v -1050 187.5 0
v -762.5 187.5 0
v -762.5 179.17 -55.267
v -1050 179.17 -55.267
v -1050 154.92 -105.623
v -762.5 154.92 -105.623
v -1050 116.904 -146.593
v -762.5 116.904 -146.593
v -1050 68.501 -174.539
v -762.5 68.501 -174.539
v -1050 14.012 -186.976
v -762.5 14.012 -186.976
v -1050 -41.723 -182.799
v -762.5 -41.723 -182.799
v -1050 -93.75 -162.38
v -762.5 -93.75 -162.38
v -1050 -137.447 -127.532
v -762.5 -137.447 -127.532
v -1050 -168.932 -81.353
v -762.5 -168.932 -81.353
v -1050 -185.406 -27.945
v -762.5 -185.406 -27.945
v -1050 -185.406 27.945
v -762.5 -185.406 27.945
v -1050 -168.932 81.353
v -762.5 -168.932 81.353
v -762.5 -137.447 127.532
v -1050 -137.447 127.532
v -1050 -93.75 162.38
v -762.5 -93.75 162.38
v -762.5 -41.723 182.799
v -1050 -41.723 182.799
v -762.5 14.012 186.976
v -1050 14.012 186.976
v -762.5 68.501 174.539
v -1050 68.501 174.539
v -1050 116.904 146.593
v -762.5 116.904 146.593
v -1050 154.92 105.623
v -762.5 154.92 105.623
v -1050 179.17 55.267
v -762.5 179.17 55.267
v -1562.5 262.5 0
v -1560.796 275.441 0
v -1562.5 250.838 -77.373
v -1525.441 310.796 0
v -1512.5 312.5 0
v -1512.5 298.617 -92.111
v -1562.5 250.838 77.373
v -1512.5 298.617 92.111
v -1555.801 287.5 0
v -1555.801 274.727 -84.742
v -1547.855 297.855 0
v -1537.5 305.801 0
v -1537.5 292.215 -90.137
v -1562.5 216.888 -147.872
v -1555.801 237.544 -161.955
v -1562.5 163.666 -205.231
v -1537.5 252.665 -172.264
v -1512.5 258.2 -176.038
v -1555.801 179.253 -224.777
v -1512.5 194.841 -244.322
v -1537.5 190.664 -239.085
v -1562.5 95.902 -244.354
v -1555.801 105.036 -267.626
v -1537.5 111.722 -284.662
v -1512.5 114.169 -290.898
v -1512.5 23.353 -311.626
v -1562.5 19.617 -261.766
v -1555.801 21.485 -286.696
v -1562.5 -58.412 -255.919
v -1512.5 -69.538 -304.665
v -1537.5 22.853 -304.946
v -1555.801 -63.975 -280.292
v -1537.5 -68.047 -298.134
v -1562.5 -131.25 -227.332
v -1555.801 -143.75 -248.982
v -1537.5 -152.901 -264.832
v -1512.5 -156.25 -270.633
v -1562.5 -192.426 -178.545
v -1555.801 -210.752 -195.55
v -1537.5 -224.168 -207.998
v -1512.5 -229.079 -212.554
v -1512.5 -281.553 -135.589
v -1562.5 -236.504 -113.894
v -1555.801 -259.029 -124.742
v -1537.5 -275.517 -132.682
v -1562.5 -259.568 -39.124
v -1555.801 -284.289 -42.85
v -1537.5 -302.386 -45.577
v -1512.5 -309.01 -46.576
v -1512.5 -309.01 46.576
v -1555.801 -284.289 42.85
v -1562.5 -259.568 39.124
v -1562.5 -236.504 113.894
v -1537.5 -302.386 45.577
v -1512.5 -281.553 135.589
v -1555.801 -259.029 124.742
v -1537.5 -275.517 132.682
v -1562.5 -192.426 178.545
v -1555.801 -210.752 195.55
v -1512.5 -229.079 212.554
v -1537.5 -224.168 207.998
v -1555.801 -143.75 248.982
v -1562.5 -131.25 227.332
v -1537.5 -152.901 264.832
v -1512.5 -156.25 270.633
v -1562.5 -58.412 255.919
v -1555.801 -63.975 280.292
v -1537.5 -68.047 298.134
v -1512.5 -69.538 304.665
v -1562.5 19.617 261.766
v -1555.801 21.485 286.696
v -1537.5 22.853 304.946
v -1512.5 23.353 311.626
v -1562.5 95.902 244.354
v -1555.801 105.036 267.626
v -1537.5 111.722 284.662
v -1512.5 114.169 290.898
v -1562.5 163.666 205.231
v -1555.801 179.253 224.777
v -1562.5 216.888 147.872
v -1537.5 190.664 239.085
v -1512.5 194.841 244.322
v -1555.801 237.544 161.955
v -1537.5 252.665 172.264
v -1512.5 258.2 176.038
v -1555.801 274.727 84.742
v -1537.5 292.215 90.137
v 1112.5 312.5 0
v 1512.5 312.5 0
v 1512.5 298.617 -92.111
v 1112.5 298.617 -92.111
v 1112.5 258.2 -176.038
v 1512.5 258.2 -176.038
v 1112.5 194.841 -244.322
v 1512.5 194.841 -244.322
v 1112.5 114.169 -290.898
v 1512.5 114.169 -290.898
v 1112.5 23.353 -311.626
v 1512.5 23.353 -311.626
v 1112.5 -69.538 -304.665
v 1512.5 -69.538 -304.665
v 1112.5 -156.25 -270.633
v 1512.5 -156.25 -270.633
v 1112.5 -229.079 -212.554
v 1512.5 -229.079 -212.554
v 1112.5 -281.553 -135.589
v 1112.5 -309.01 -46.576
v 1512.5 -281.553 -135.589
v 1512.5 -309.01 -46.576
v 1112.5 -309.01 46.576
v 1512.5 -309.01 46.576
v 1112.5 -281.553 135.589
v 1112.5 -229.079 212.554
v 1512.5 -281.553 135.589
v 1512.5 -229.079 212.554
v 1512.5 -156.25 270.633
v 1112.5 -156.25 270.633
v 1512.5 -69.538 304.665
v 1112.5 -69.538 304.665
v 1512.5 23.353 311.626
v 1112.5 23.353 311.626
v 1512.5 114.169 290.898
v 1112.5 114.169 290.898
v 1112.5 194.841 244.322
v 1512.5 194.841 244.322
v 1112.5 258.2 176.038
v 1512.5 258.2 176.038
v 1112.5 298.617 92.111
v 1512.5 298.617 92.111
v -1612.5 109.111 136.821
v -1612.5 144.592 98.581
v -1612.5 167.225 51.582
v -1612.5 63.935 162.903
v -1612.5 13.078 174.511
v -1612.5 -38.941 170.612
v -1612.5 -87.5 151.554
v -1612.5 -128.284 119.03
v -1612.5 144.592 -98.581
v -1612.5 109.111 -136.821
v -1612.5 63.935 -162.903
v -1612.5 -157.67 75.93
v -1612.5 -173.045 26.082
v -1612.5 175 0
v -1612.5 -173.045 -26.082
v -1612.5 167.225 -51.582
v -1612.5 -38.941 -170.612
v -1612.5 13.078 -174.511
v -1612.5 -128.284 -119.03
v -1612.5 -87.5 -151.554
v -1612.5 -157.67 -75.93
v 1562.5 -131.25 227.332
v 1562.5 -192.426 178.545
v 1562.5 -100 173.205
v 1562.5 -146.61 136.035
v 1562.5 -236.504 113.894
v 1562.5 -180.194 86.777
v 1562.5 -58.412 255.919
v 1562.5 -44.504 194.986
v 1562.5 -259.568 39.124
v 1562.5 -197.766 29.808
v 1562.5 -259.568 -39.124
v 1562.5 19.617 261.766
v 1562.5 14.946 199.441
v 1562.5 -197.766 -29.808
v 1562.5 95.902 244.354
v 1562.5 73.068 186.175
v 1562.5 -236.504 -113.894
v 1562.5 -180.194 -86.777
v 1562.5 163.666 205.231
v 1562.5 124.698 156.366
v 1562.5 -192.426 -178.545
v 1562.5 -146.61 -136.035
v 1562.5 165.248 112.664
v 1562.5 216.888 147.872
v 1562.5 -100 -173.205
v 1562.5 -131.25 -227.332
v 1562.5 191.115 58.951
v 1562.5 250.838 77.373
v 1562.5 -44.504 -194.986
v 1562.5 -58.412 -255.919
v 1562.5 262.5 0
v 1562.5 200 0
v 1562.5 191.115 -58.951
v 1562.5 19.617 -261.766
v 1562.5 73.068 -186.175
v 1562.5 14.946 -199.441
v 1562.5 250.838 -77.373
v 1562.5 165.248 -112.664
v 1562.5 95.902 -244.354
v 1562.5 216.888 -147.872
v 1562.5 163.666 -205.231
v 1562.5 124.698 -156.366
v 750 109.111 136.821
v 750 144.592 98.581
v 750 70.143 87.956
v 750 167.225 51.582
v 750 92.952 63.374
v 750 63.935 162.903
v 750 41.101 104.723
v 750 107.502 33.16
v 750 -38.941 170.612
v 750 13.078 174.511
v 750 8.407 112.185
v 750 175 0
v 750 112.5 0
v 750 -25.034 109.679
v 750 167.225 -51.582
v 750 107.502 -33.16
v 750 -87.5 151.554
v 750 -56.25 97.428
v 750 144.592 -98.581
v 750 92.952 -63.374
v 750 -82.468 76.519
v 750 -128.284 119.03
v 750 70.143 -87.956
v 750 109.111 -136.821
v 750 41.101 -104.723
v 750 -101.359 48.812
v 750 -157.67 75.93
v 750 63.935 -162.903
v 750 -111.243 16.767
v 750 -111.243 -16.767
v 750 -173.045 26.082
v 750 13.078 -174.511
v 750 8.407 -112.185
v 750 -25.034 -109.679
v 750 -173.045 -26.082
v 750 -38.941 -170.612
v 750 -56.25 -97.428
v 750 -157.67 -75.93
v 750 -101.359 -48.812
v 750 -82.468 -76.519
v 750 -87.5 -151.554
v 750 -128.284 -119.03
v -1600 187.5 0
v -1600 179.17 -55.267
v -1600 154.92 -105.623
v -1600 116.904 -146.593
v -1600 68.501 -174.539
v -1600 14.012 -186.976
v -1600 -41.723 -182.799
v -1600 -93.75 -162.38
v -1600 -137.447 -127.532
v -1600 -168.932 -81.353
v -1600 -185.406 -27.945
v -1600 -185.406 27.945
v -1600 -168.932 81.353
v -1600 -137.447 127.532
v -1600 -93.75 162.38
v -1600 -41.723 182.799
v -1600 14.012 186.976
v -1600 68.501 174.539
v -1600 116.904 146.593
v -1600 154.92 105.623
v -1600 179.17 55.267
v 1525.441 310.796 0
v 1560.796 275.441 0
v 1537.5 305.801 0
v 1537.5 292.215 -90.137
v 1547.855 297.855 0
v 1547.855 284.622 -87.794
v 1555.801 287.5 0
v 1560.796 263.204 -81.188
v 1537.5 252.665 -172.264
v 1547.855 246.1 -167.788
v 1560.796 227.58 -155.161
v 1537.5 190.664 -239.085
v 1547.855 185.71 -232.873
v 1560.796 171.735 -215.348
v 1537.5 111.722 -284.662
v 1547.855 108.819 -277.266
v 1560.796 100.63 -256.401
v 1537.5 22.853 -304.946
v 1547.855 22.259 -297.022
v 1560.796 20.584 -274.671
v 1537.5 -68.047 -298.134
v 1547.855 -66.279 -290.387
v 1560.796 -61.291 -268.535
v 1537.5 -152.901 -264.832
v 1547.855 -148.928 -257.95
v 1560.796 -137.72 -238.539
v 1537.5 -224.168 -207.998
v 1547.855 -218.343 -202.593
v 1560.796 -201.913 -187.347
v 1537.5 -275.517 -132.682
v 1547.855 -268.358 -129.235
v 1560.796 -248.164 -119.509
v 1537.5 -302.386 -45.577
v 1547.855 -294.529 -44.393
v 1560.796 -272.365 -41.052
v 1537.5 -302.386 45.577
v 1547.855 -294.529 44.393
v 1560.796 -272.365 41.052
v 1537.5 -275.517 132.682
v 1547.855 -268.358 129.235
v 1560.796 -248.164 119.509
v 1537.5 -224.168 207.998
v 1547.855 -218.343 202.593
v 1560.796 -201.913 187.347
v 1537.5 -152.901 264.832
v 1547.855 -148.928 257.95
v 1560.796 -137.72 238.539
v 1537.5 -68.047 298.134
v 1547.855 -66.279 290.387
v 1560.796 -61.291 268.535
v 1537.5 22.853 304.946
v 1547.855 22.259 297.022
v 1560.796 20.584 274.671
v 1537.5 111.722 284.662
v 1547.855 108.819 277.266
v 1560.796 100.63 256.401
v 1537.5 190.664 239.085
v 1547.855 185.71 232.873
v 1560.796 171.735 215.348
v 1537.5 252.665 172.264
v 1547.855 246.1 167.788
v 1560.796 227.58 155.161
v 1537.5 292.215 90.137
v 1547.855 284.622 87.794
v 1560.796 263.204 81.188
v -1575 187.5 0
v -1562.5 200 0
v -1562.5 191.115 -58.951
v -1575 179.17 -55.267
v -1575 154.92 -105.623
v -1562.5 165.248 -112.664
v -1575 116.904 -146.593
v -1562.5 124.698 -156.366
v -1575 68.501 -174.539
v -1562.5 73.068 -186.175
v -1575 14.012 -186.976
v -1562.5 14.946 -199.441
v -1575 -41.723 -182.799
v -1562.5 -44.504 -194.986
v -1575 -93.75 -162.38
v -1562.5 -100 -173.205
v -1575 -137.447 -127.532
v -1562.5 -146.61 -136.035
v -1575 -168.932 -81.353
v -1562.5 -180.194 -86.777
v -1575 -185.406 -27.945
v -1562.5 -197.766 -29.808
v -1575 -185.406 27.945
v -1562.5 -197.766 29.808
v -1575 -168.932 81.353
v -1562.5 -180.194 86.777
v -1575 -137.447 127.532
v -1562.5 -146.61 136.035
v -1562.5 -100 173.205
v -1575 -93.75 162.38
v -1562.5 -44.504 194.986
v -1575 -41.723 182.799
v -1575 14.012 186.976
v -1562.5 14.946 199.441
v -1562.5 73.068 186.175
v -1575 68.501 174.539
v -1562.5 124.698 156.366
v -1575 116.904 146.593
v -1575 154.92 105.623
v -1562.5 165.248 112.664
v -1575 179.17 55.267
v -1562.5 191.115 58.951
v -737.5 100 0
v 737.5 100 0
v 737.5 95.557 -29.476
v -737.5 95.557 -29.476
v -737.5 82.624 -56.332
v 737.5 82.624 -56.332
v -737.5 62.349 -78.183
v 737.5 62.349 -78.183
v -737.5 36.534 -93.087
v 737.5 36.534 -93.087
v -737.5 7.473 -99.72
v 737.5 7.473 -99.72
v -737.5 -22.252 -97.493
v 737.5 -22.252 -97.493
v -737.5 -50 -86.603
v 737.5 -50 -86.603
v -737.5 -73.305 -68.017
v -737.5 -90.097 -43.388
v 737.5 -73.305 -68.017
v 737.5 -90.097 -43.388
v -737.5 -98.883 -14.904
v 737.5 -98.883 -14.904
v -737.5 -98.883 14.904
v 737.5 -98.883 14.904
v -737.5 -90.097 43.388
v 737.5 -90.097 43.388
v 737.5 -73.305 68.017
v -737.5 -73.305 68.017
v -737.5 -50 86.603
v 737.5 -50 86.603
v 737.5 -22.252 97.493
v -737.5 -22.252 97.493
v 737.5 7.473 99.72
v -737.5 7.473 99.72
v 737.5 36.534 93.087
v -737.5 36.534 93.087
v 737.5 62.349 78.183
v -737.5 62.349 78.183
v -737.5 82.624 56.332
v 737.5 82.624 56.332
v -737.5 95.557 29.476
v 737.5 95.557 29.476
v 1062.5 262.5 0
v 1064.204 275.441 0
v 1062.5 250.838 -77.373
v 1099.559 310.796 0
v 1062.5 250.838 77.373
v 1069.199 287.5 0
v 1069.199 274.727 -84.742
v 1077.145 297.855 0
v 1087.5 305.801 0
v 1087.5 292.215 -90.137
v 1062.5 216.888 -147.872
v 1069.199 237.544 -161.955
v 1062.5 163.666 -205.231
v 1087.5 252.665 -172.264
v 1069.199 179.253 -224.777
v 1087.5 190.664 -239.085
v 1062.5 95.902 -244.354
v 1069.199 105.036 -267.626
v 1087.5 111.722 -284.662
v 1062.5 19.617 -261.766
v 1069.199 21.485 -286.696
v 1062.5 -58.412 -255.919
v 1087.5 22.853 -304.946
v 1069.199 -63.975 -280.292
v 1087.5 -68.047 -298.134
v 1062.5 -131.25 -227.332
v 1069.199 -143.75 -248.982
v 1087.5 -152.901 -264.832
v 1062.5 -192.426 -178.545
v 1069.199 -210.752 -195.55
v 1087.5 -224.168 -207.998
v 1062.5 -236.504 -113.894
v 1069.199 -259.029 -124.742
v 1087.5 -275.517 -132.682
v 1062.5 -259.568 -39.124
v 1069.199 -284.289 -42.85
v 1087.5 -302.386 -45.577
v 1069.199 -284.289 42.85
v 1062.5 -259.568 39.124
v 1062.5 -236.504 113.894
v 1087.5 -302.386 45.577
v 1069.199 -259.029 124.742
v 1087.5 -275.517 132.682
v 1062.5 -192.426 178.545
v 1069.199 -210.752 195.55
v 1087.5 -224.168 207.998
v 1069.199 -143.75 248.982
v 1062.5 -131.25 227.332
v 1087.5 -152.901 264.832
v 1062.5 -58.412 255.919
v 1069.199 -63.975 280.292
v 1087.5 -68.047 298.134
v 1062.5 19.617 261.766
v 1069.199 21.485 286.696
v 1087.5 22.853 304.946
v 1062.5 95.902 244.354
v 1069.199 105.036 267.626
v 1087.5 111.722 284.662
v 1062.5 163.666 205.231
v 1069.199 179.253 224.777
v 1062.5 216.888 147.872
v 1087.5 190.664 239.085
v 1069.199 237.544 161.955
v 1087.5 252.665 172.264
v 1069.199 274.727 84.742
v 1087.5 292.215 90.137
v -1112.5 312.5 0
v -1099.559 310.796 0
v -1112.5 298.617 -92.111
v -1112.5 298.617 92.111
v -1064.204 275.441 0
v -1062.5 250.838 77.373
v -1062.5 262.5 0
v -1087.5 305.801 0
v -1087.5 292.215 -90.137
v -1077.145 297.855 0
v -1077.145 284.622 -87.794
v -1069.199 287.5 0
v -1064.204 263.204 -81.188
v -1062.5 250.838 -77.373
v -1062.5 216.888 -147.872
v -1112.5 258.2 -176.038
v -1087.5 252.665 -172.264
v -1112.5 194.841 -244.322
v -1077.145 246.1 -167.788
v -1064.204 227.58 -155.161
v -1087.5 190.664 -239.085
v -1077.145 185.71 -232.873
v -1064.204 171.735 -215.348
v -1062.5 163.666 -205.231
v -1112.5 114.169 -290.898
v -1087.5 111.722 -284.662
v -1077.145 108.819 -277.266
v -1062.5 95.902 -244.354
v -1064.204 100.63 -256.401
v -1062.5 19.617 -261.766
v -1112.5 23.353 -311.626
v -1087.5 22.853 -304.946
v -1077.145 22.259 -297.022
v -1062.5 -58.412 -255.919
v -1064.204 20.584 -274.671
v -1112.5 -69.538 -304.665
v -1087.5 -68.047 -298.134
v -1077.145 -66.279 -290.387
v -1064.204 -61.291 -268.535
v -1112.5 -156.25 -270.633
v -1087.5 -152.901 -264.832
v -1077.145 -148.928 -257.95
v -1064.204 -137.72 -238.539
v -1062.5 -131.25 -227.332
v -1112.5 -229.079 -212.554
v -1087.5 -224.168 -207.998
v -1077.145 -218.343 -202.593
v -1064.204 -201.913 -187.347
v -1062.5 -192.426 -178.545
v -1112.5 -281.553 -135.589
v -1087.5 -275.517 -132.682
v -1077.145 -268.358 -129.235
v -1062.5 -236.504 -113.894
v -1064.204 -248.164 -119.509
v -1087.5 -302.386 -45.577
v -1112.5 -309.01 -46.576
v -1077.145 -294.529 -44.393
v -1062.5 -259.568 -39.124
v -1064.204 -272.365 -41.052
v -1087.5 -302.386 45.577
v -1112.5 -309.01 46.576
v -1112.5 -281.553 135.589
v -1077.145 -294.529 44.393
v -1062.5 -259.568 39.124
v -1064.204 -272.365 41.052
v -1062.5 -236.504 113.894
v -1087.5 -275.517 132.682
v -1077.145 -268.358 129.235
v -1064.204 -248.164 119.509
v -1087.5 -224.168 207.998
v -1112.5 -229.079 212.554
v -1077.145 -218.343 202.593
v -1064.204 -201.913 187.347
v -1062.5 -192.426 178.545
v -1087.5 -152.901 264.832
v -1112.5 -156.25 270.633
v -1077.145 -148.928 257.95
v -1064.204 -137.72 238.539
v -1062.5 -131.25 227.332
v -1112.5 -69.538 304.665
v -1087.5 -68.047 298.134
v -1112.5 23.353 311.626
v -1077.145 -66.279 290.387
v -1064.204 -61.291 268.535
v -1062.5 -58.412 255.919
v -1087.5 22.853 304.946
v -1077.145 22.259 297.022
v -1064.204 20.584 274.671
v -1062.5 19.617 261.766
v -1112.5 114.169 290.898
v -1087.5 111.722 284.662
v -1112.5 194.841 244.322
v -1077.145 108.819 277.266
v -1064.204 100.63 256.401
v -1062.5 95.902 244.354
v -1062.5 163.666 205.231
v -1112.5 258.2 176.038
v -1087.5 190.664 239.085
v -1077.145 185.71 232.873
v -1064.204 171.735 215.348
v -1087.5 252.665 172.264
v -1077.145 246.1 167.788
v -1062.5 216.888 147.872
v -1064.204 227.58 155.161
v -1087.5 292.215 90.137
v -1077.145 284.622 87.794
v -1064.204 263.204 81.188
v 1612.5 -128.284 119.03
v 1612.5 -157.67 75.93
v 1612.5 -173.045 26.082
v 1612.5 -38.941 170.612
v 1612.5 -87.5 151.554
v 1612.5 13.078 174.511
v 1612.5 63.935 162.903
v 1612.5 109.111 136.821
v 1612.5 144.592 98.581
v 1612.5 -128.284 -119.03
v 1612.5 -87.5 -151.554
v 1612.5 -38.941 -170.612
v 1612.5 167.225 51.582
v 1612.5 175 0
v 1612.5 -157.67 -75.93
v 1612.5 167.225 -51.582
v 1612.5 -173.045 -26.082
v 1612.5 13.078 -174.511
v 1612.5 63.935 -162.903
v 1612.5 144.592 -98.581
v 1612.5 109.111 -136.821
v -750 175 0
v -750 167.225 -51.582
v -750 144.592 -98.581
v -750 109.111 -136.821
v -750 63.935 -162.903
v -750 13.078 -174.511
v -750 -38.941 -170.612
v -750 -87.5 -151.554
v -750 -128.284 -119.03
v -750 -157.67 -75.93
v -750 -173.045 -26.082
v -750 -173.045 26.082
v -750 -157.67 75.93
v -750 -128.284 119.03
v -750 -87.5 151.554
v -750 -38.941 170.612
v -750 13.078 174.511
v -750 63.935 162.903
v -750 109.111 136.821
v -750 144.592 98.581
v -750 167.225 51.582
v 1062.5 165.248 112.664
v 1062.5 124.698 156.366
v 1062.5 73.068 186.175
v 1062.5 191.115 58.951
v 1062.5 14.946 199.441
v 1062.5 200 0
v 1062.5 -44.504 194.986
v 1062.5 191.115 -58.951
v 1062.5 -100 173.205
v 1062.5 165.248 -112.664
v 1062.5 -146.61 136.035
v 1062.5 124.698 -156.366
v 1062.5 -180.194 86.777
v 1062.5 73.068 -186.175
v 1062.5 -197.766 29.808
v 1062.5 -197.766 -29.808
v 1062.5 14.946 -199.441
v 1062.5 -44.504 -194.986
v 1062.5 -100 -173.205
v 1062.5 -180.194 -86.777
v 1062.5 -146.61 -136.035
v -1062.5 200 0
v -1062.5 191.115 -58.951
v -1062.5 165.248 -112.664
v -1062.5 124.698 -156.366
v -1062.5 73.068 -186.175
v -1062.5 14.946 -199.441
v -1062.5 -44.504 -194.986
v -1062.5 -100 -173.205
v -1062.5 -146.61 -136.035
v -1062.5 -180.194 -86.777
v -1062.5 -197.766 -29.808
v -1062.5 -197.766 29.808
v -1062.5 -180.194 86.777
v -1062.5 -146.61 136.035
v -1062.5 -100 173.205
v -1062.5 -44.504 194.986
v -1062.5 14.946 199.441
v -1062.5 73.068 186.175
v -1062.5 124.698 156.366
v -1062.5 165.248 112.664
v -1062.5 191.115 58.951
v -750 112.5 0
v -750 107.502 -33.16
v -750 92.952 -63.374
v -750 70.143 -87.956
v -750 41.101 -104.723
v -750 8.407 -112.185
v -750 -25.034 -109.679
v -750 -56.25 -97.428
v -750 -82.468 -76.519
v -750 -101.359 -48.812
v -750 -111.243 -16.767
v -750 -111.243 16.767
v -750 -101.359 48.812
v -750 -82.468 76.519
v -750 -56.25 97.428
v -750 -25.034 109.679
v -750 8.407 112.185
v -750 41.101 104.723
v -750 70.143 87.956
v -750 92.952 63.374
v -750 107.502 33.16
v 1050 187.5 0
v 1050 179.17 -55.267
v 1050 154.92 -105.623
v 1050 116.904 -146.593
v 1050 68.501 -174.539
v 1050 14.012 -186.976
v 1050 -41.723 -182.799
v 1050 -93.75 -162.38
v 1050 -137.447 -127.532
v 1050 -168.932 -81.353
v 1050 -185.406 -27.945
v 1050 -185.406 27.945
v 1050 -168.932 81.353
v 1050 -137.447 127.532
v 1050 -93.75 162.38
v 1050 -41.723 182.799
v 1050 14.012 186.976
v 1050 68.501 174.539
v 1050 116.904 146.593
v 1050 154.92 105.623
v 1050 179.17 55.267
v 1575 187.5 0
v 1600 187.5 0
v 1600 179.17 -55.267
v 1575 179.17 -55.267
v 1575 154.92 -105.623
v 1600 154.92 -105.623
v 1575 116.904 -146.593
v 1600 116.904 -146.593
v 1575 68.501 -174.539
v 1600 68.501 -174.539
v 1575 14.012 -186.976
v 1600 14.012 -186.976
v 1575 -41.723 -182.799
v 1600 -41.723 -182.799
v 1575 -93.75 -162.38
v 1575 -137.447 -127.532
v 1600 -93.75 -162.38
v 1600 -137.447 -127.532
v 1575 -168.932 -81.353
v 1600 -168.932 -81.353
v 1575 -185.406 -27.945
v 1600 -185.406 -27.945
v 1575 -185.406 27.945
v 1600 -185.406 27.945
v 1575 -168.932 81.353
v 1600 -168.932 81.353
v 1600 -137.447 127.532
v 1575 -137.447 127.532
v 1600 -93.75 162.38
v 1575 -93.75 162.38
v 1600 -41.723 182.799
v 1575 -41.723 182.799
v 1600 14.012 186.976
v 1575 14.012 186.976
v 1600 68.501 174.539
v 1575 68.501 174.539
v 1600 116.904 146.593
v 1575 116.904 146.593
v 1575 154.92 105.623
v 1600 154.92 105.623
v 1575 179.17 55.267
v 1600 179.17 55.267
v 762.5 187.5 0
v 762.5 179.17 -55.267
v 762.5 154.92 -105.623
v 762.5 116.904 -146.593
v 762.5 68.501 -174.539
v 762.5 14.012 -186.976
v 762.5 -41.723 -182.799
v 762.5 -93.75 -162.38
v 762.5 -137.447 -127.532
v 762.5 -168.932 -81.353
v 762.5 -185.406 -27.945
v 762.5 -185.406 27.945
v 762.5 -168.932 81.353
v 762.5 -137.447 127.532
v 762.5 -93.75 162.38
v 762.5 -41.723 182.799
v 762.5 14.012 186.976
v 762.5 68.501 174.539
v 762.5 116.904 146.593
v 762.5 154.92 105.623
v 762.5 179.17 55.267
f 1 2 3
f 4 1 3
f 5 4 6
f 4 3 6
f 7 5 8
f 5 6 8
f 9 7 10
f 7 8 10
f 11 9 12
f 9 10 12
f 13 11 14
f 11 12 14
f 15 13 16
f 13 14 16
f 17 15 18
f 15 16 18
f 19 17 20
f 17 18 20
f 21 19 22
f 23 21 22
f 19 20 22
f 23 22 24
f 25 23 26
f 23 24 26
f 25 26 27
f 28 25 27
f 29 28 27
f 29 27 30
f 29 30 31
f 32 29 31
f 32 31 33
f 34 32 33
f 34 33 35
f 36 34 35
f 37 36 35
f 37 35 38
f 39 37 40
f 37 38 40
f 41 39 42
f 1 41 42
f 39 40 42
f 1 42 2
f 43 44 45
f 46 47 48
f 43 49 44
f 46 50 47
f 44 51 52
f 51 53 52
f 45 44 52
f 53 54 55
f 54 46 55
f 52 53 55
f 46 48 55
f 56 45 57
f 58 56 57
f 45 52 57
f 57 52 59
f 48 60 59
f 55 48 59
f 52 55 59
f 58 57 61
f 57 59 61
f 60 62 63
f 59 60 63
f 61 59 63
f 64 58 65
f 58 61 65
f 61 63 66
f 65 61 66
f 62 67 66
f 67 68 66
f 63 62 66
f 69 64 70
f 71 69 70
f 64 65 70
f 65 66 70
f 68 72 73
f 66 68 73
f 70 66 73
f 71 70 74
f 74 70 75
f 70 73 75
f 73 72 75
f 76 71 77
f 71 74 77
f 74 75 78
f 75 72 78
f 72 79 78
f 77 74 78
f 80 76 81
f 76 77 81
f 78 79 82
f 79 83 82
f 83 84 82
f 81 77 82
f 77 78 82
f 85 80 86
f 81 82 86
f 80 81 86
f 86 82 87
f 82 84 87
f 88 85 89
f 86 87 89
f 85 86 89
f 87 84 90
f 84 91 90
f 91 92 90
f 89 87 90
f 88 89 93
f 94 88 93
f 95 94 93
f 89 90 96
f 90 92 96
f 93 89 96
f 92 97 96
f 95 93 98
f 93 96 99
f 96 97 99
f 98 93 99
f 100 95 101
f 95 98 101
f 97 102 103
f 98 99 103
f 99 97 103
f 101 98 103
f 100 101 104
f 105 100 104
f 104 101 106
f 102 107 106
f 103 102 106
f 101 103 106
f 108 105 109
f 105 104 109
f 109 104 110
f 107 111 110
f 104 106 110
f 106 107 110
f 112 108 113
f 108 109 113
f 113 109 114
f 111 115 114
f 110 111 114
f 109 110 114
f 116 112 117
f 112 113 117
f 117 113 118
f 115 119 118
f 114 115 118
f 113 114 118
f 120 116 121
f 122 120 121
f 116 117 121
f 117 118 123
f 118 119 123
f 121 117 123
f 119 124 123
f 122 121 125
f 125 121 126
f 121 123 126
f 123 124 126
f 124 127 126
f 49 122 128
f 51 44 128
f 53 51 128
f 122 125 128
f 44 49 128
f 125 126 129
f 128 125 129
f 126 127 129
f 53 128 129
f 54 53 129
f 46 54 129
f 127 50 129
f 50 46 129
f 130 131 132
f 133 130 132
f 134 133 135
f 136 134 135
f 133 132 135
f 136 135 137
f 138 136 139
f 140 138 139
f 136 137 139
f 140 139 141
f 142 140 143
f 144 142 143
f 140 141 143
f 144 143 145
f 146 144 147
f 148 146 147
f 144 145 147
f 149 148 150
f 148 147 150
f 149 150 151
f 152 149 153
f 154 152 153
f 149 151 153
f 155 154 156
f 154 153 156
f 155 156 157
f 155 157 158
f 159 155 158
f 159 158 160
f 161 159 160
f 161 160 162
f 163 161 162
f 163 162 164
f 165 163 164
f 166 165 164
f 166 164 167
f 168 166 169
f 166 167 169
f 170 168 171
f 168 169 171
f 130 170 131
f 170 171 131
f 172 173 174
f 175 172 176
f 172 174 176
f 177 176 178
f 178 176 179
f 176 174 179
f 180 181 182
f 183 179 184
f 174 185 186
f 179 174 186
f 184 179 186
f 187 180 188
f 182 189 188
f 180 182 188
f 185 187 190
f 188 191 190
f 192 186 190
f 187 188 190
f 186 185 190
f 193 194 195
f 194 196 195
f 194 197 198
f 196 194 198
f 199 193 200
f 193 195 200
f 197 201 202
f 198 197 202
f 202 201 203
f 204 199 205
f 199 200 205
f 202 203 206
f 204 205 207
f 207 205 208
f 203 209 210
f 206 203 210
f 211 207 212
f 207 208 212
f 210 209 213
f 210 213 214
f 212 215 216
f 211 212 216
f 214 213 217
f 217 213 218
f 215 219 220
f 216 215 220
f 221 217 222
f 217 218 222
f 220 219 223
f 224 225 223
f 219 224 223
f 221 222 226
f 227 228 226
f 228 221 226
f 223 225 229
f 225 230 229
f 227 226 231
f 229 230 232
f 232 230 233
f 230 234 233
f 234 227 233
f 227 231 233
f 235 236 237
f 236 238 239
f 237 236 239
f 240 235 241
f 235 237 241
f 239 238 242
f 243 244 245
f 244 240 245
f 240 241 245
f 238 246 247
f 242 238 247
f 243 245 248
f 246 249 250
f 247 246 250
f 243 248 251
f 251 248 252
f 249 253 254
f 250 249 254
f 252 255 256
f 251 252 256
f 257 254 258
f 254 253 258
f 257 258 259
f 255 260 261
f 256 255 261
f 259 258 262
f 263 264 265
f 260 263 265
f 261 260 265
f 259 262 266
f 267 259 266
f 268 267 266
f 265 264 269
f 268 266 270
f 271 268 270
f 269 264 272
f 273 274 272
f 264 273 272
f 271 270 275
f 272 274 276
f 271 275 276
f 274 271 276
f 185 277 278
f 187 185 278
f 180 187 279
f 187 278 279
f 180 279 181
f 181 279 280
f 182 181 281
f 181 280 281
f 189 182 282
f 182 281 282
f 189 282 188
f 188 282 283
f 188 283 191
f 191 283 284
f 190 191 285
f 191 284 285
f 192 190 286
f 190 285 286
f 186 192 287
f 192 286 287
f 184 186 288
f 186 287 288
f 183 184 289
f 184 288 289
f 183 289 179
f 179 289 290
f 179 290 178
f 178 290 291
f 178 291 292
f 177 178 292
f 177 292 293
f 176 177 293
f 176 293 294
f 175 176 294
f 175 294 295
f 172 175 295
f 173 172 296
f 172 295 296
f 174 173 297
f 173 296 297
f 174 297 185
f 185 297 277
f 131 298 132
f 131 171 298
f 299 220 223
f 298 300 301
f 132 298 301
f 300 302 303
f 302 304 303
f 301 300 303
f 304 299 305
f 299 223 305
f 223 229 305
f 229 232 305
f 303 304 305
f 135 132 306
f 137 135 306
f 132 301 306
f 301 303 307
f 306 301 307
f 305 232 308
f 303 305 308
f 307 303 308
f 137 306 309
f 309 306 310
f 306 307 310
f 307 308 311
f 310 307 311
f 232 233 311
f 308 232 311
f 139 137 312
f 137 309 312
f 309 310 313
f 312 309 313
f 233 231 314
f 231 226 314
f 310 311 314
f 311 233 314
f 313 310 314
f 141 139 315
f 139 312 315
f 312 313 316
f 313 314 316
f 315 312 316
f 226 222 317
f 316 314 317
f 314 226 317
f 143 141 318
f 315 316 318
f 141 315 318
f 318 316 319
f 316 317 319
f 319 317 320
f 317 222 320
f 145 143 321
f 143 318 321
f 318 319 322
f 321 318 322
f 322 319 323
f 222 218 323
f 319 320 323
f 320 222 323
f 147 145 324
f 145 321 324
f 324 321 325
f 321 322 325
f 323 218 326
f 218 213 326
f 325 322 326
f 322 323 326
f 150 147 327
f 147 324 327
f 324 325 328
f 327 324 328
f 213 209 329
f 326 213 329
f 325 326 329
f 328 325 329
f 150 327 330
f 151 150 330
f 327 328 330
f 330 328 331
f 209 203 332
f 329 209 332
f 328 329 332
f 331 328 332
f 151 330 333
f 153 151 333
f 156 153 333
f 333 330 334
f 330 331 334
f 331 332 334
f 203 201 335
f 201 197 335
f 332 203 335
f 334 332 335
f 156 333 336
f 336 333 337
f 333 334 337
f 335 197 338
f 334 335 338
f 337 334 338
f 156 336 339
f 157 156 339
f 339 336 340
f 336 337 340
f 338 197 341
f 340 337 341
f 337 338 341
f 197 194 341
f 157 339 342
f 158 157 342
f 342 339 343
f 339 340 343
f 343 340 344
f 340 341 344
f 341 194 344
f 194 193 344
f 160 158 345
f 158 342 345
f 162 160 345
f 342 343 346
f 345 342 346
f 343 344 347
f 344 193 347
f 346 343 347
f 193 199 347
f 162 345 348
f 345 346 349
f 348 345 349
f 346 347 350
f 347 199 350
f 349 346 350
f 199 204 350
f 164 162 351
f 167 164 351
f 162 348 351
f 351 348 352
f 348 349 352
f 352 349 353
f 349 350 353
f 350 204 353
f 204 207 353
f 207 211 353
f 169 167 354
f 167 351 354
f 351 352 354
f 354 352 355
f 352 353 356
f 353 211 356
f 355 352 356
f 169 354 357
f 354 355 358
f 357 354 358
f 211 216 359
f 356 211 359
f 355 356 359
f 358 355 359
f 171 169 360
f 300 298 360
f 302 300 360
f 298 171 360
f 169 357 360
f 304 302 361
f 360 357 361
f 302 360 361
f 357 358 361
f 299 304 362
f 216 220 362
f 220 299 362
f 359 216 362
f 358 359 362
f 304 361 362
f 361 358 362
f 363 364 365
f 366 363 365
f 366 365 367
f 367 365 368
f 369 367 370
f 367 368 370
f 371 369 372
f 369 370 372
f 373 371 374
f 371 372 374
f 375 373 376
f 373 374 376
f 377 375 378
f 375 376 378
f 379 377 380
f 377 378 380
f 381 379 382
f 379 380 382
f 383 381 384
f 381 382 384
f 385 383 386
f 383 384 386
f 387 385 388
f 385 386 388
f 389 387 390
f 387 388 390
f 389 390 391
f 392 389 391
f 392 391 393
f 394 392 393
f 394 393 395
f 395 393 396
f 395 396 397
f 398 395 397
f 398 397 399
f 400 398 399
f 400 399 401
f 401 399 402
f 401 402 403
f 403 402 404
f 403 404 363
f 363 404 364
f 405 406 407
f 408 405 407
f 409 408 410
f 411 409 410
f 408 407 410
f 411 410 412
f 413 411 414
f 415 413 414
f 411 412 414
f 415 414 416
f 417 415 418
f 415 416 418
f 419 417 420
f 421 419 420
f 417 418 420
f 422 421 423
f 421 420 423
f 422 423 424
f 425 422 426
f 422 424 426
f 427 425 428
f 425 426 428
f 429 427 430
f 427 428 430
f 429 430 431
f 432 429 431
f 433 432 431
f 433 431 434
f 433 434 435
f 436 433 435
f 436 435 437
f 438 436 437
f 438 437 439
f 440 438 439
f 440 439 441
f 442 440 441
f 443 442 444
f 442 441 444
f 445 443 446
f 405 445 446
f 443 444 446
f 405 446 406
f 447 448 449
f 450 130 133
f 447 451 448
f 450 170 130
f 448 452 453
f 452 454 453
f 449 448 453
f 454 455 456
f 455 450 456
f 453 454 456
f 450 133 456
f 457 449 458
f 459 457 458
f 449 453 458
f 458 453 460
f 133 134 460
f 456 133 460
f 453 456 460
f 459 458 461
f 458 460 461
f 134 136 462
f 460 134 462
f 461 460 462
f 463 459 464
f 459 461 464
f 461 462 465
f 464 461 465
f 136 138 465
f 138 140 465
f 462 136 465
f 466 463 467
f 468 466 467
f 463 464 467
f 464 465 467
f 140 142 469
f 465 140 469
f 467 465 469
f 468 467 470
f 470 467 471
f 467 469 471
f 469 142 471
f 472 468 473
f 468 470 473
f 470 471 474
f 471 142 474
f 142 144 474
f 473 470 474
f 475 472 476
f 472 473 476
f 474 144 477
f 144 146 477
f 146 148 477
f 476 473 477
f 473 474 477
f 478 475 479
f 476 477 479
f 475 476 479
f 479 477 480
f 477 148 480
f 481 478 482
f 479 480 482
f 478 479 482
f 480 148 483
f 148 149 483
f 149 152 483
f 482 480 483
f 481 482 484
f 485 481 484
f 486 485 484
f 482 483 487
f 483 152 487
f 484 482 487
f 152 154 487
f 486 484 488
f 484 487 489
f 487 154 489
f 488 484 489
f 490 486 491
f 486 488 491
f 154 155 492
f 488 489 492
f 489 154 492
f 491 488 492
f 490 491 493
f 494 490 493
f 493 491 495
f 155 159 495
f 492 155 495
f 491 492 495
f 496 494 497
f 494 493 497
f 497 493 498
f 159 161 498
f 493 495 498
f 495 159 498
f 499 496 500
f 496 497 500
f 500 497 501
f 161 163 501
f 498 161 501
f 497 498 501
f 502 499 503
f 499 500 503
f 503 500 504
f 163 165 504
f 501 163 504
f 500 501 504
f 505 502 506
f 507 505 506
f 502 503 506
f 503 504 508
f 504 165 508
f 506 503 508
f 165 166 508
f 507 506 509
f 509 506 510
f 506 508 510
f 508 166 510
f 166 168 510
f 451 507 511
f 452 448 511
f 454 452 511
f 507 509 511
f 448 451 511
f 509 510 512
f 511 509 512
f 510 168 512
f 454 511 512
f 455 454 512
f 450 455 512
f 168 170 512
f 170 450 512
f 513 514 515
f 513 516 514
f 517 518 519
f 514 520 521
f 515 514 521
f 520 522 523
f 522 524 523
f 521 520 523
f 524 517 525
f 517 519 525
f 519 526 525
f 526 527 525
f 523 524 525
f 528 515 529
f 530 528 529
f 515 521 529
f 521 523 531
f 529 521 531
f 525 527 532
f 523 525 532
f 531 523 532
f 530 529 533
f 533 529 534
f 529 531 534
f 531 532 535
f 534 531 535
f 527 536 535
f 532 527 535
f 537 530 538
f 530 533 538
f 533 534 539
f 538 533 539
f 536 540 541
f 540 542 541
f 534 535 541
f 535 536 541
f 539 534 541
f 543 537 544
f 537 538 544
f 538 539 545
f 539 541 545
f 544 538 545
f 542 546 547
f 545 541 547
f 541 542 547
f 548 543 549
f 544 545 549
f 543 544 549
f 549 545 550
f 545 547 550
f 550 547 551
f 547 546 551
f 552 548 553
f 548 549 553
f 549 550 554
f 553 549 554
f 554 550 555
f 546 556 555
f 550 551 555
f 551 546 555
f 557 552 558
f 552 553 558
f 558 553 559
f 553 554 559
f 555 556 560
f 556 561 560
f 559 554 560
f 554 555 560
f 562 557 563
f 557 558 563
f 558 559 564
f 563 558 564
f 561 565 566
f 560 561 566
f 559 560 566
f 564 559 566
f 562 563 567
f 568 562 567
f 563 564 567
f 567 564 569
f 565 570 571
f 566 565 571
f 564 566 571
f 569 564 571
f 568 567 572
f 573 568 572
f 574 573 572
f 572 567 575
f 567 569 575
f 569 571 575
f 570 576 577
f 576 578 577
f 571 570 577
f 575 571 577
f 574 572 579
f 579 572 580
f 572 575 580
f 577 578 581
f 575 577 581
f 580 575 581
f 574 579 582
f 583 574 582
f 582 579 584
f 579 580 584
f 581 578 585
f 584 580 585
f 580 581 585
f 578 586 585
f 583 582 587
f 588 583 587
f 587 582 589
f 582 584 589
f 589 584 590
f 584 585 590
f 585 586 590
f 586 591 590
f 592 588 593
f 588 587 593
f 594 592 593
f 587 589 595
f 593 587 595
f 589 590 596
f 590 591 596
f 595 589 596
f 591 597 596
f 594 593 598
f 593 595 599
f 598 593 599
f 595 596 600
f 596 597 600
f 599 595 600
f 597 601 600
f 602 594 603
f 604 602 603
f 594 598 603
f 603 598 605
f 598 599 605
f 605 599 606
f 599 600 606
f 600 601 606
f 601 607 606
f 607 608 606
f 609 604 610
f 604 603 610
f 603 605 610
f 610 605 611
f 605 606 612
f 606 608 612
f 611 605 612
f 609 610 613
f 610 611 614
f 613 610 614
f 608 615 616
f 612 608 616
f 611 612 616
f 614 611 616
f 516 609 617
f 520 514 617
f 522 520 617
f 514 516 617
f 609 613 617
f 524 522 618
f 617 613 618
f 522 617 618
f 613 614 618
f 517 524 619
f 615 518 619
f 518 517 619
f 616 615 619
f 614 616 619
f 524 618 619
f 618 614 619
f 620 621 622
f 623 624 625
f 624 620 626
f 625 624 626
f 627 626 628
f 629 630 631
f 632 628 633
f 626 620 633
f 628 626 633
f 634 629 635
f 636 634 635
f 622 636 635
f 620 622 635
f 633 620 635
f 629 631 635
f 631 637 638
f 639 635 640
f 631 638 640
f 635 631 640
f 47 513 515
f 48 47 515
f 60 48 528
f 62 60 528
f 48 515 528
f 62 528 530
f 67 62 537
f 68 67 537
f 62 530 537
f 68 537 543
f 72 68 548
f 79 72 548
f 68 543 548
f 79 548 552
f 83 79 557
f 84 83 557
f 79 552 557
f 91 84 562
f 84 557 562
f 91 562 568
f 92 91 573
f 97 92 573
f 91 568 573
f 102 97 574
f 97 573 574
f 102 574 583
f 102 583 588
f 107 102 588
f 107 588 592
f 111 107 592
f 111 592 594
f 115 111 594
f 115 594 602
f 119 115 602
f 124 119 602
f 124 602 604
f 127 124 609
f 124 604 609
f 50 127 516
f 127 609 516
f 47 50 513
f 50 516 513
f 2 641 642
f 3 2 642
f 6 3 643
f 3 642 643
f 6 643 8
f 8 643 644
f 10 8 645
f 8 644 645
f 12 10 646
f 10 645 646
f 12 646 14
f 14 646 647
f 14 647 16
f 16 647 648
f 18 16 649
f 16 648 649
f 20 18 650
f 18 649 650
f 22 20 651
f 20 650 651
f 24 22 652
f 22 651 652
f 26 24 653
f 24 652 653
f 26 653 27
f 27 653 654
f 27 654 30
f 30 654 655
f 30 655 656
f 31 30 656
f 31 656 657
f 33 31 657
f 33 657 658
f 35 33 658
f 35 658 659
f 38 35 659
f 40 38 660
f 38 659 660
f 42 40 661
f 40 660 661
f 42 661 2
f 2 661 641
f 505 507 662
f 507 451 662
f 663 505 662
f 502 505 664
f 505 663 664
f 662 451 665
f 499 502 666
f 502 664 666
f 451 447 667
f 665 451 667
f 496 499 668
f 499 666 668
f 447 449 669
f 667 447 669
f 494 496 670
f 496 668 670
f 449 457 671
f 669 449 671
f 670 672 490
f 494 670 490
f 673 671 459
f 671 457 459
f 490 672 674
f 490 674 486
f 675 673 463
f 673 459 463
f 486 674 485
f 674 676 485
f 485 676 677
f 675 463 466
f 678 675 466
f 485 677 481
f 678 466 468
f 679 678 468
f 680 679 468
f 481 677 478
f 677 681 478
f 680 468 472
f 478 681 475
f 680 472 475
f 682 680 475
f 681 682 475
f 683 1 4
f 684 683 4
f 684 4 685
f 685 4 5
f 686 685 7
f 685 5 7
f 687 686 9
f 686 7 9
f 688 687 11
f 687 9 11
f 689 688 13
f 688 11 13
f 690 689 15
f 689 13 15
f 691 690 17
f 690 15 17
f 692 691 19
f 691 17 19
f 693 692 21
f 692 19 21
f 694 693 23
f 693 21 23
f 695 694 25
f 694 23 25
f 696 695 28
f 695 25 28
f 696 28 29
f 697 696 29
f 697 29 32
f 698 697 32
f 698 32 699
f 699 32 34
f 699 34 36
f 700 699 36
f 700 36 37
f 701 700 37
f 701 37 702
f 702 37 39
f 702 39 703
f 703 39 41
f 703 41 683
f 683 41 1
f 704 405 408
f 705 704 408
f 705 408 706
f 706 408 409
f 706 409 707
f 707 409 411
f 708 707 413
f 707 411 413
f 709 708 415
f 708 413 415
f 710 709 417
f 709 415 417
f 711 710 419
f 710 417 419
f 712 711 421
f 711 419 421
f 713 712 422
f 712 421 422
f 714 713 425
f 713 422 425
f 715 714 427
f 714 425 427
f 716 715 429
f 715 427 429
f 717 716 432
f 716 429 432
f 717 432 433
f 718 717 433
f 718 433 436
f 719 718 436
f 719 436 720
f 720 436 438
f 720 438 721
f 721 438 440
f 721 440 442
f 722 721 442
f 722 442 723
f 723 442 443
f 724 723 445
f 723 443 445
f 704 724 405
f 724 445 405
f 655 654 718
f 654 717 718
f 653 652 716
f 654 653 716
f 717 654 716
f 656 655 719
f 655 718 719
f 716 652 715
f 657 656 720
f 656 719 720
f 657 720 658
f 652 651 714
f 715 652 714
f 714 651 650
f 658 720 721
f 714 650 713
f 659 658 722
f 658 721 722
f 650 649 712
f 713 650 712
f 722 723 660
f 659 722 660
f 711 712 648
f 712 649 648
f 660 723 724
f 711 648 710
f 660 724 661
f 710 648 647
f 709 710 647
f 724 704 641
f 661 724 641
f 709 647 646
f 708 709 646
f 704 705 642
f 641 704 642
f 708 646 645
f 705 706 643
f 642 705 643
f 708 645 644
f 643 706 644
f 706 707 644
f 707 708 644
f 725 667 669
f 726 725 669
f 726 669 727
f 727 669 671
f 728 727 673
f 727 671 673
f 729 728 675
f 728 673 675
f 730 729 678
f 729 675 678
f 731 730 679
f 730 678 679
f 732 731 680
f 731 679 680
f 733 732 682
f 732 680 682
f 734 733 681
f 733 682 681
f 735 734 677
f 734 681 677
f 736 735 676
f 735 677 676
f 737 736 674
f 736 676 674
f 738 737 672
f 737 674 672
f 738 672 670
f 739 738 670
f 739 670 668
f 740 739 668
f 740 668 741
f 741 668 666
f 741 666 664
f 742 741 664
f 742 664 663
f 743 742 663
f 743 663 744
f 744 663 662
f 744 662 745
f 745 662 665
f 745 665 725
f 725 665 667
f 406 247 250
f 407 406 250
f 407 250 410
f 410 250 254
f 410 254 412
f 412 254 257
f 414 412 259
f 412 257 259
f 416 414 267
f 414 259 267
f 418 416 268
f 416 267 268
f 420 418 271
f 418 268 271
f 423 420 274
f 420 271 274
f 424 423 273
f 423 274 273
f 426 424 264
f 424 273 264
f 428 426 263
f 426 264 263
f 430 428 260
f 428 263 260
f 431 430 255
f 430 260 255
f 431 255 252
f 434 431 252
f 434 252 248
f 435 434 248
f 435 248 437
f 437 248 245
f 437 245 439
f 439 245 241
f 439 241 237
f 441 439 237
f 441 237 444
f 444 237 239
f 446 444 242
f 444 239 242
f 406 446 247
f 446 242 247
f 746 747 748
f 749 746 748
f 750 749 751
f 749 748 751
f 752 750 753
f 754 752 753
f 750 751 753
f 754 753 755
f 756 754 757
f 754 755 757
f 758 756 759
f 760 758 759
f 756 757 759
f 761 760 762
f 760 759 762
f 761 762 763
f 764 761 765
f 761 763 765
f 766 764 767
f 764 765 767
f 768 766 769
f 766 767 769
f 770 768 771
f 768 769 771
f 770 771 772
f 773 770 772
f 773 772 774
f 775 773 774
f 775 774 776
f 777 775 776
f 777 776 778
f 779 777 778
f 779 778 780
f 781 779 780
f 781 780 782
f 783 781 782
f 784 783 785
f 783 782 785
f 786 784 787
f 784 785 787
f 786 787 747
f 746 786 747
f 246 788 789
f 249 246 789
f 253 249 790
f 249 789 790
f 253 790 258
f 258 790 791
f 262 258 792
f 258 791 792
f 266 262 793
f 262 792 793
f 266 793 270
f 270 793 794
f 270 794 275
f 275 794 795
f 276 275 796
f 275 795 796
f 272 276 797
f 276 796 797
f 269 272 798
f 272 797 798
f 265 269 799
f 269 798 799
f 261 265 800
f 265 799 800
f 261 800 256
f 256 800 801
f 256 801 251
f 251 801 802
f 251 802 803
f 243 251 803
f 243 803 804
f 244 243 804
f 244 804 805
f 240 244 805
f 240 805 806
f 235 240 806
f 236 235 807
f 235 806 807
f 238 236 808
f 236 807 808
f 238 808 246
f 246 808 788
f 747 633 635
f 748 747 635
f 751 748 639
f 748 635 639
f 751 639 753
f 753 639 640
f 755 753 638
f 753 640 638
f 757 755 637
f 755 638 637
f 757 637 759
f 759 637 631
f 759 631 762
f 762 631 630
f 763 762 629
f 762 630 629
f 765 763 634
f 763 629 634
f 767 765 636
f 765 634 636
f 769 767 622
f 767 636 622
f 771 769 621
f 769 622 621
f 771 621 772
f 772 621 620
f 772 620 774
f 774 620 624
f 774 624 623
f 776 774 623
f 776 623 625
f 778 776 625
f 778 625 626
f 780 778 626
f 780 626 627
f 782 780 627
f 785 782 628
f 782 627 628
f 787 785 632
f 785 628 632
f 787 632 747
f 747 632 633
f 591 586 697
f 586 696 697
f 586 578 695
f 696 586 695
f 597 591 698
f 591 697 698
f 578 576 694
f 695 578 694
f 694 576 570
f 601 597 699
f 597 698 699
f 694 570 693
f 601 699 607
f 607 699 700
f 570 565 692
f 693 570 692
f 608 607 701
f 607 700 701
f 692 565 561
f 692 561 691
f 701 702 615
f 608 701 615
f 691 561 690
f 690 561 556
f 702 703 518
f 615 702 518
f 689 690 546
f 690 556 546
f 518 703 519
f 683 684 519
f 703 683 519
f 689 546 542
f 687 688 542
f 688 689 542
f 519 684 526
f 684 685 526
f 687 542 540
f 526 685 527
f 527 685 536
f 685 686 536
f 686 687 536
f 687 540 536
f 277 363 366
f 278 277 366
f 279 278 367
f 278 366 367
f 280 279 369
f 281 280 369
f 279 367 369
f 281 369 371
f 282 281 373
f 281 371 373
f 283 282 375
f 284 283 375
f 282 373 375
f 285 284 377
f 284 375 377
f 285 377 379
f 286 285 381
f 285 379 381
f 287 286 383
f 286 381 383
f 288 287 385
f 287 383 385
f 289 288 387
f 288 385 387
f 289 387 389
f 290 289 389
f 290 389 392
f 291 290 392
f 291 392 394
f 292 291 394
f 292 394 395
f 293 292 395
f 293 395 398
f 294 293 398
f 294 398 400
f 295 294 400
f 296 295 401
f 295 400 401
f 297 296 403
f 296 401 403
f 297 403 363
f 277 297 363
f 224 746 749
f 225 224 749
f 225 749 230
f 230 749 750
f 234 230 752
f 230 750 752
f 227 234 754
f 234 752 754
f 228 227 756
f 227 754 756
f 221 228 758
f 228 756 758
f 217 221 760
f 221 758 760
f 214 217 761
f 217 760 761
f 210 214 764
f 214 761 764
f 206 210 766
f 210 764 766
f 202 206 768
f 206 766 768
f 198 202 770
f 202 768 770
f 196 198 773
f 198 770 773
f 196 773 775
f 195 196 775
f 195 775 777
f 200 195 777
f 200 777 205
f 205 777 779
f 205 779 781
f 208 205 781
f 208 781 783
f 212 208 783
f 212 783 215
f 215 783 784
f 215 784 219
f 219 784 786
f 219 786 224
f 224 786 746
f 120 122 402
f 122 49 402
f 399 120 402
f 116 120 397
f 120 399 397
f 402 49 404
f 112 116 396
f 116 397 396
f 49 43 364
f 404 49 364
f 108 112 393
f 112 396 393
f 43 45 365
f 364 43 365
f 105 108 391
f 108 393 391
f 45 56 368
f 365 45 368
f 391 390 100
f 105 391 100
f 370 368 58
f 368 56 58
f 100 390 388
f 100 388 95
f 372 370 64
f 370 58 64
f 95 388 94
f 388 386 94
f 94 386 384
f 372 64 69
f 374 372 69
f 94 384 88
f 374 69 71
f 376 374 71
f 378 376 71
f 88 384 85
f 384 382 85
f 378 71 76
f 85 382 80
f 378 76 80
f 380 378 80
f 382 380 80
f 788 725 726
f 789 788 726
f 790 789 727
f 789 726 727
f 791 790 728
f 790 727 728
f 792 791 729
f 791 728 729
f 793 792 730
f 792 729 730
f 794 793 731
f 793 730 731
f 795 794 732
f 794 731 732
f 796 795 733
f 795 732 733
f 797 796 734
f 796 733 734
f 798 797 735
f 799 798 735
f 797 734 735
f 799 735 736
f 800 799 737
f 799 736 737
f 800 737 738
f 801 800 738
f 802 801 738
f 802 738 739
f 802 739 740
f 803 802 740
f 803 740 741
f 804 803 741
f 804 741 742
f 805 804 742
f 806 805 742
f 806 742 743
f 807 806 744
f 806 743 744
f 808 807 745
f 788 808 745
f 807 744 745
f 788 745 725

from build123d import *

# Parameters (mm, degrees)
CHAMFER1_SIZE = 12.5
FILLET1_R     = 50


with BuildPart() as part:
    # Sketch1 → Revolve1 (revolve)
    with BuildSketch(Plane.XY):
        Polygon((1612.5, 0), (-1612.5, 0), (-1612.5, 187.5), (-1562.5, 187.5), (-1562.5, 312.5), (-1062.5, 312.5), (-1062.5, 187.5), (-750, 187.5), (-750, 100), (750, 100), (750, 187.5), (1062.5, 187.5), (1062.5, 312.5), (1562.5, 312.5), (1562.5, 187.5), (1612.5, 187.5), align=None)
    revolve(axis=Axis((1612.5, 0, 0), (-1, 0, 0)))

    # Chamfer1
    chamfer1_edges = [part.edges().sort_by_distance(p)[0] for p in [
        (-1562.5, -187.5, 0),
        (-1612.5, -187.5, 0),
        (1612.5, -187.5, 0),
        (1562.5, -187.5, 0),
        (1062.5, -187.5, 0),
        (750, -187.5, 0),
        (750, -100, 0),
        (-750, -100, 0),
        (-750, -187.5, 0),
        (-1062.5, -187.5, 0),
    ]]
    chamfer(chamfer1_edges, length=CHAMFER1_SIZE)

    # Fillet1
    fillet1_edges = [part.edges().sort_by_distance(p)[0] for p in [
        (-1562.5, -312.5, 0),
        (1562.5, -312.5, 0),
        (1062.5, -312.5, 0),
        (-1062.5, -312.5, 0),
    ]]
    fillet(fillet1_edges, radius=FILLET1_R)


solid = part.part
